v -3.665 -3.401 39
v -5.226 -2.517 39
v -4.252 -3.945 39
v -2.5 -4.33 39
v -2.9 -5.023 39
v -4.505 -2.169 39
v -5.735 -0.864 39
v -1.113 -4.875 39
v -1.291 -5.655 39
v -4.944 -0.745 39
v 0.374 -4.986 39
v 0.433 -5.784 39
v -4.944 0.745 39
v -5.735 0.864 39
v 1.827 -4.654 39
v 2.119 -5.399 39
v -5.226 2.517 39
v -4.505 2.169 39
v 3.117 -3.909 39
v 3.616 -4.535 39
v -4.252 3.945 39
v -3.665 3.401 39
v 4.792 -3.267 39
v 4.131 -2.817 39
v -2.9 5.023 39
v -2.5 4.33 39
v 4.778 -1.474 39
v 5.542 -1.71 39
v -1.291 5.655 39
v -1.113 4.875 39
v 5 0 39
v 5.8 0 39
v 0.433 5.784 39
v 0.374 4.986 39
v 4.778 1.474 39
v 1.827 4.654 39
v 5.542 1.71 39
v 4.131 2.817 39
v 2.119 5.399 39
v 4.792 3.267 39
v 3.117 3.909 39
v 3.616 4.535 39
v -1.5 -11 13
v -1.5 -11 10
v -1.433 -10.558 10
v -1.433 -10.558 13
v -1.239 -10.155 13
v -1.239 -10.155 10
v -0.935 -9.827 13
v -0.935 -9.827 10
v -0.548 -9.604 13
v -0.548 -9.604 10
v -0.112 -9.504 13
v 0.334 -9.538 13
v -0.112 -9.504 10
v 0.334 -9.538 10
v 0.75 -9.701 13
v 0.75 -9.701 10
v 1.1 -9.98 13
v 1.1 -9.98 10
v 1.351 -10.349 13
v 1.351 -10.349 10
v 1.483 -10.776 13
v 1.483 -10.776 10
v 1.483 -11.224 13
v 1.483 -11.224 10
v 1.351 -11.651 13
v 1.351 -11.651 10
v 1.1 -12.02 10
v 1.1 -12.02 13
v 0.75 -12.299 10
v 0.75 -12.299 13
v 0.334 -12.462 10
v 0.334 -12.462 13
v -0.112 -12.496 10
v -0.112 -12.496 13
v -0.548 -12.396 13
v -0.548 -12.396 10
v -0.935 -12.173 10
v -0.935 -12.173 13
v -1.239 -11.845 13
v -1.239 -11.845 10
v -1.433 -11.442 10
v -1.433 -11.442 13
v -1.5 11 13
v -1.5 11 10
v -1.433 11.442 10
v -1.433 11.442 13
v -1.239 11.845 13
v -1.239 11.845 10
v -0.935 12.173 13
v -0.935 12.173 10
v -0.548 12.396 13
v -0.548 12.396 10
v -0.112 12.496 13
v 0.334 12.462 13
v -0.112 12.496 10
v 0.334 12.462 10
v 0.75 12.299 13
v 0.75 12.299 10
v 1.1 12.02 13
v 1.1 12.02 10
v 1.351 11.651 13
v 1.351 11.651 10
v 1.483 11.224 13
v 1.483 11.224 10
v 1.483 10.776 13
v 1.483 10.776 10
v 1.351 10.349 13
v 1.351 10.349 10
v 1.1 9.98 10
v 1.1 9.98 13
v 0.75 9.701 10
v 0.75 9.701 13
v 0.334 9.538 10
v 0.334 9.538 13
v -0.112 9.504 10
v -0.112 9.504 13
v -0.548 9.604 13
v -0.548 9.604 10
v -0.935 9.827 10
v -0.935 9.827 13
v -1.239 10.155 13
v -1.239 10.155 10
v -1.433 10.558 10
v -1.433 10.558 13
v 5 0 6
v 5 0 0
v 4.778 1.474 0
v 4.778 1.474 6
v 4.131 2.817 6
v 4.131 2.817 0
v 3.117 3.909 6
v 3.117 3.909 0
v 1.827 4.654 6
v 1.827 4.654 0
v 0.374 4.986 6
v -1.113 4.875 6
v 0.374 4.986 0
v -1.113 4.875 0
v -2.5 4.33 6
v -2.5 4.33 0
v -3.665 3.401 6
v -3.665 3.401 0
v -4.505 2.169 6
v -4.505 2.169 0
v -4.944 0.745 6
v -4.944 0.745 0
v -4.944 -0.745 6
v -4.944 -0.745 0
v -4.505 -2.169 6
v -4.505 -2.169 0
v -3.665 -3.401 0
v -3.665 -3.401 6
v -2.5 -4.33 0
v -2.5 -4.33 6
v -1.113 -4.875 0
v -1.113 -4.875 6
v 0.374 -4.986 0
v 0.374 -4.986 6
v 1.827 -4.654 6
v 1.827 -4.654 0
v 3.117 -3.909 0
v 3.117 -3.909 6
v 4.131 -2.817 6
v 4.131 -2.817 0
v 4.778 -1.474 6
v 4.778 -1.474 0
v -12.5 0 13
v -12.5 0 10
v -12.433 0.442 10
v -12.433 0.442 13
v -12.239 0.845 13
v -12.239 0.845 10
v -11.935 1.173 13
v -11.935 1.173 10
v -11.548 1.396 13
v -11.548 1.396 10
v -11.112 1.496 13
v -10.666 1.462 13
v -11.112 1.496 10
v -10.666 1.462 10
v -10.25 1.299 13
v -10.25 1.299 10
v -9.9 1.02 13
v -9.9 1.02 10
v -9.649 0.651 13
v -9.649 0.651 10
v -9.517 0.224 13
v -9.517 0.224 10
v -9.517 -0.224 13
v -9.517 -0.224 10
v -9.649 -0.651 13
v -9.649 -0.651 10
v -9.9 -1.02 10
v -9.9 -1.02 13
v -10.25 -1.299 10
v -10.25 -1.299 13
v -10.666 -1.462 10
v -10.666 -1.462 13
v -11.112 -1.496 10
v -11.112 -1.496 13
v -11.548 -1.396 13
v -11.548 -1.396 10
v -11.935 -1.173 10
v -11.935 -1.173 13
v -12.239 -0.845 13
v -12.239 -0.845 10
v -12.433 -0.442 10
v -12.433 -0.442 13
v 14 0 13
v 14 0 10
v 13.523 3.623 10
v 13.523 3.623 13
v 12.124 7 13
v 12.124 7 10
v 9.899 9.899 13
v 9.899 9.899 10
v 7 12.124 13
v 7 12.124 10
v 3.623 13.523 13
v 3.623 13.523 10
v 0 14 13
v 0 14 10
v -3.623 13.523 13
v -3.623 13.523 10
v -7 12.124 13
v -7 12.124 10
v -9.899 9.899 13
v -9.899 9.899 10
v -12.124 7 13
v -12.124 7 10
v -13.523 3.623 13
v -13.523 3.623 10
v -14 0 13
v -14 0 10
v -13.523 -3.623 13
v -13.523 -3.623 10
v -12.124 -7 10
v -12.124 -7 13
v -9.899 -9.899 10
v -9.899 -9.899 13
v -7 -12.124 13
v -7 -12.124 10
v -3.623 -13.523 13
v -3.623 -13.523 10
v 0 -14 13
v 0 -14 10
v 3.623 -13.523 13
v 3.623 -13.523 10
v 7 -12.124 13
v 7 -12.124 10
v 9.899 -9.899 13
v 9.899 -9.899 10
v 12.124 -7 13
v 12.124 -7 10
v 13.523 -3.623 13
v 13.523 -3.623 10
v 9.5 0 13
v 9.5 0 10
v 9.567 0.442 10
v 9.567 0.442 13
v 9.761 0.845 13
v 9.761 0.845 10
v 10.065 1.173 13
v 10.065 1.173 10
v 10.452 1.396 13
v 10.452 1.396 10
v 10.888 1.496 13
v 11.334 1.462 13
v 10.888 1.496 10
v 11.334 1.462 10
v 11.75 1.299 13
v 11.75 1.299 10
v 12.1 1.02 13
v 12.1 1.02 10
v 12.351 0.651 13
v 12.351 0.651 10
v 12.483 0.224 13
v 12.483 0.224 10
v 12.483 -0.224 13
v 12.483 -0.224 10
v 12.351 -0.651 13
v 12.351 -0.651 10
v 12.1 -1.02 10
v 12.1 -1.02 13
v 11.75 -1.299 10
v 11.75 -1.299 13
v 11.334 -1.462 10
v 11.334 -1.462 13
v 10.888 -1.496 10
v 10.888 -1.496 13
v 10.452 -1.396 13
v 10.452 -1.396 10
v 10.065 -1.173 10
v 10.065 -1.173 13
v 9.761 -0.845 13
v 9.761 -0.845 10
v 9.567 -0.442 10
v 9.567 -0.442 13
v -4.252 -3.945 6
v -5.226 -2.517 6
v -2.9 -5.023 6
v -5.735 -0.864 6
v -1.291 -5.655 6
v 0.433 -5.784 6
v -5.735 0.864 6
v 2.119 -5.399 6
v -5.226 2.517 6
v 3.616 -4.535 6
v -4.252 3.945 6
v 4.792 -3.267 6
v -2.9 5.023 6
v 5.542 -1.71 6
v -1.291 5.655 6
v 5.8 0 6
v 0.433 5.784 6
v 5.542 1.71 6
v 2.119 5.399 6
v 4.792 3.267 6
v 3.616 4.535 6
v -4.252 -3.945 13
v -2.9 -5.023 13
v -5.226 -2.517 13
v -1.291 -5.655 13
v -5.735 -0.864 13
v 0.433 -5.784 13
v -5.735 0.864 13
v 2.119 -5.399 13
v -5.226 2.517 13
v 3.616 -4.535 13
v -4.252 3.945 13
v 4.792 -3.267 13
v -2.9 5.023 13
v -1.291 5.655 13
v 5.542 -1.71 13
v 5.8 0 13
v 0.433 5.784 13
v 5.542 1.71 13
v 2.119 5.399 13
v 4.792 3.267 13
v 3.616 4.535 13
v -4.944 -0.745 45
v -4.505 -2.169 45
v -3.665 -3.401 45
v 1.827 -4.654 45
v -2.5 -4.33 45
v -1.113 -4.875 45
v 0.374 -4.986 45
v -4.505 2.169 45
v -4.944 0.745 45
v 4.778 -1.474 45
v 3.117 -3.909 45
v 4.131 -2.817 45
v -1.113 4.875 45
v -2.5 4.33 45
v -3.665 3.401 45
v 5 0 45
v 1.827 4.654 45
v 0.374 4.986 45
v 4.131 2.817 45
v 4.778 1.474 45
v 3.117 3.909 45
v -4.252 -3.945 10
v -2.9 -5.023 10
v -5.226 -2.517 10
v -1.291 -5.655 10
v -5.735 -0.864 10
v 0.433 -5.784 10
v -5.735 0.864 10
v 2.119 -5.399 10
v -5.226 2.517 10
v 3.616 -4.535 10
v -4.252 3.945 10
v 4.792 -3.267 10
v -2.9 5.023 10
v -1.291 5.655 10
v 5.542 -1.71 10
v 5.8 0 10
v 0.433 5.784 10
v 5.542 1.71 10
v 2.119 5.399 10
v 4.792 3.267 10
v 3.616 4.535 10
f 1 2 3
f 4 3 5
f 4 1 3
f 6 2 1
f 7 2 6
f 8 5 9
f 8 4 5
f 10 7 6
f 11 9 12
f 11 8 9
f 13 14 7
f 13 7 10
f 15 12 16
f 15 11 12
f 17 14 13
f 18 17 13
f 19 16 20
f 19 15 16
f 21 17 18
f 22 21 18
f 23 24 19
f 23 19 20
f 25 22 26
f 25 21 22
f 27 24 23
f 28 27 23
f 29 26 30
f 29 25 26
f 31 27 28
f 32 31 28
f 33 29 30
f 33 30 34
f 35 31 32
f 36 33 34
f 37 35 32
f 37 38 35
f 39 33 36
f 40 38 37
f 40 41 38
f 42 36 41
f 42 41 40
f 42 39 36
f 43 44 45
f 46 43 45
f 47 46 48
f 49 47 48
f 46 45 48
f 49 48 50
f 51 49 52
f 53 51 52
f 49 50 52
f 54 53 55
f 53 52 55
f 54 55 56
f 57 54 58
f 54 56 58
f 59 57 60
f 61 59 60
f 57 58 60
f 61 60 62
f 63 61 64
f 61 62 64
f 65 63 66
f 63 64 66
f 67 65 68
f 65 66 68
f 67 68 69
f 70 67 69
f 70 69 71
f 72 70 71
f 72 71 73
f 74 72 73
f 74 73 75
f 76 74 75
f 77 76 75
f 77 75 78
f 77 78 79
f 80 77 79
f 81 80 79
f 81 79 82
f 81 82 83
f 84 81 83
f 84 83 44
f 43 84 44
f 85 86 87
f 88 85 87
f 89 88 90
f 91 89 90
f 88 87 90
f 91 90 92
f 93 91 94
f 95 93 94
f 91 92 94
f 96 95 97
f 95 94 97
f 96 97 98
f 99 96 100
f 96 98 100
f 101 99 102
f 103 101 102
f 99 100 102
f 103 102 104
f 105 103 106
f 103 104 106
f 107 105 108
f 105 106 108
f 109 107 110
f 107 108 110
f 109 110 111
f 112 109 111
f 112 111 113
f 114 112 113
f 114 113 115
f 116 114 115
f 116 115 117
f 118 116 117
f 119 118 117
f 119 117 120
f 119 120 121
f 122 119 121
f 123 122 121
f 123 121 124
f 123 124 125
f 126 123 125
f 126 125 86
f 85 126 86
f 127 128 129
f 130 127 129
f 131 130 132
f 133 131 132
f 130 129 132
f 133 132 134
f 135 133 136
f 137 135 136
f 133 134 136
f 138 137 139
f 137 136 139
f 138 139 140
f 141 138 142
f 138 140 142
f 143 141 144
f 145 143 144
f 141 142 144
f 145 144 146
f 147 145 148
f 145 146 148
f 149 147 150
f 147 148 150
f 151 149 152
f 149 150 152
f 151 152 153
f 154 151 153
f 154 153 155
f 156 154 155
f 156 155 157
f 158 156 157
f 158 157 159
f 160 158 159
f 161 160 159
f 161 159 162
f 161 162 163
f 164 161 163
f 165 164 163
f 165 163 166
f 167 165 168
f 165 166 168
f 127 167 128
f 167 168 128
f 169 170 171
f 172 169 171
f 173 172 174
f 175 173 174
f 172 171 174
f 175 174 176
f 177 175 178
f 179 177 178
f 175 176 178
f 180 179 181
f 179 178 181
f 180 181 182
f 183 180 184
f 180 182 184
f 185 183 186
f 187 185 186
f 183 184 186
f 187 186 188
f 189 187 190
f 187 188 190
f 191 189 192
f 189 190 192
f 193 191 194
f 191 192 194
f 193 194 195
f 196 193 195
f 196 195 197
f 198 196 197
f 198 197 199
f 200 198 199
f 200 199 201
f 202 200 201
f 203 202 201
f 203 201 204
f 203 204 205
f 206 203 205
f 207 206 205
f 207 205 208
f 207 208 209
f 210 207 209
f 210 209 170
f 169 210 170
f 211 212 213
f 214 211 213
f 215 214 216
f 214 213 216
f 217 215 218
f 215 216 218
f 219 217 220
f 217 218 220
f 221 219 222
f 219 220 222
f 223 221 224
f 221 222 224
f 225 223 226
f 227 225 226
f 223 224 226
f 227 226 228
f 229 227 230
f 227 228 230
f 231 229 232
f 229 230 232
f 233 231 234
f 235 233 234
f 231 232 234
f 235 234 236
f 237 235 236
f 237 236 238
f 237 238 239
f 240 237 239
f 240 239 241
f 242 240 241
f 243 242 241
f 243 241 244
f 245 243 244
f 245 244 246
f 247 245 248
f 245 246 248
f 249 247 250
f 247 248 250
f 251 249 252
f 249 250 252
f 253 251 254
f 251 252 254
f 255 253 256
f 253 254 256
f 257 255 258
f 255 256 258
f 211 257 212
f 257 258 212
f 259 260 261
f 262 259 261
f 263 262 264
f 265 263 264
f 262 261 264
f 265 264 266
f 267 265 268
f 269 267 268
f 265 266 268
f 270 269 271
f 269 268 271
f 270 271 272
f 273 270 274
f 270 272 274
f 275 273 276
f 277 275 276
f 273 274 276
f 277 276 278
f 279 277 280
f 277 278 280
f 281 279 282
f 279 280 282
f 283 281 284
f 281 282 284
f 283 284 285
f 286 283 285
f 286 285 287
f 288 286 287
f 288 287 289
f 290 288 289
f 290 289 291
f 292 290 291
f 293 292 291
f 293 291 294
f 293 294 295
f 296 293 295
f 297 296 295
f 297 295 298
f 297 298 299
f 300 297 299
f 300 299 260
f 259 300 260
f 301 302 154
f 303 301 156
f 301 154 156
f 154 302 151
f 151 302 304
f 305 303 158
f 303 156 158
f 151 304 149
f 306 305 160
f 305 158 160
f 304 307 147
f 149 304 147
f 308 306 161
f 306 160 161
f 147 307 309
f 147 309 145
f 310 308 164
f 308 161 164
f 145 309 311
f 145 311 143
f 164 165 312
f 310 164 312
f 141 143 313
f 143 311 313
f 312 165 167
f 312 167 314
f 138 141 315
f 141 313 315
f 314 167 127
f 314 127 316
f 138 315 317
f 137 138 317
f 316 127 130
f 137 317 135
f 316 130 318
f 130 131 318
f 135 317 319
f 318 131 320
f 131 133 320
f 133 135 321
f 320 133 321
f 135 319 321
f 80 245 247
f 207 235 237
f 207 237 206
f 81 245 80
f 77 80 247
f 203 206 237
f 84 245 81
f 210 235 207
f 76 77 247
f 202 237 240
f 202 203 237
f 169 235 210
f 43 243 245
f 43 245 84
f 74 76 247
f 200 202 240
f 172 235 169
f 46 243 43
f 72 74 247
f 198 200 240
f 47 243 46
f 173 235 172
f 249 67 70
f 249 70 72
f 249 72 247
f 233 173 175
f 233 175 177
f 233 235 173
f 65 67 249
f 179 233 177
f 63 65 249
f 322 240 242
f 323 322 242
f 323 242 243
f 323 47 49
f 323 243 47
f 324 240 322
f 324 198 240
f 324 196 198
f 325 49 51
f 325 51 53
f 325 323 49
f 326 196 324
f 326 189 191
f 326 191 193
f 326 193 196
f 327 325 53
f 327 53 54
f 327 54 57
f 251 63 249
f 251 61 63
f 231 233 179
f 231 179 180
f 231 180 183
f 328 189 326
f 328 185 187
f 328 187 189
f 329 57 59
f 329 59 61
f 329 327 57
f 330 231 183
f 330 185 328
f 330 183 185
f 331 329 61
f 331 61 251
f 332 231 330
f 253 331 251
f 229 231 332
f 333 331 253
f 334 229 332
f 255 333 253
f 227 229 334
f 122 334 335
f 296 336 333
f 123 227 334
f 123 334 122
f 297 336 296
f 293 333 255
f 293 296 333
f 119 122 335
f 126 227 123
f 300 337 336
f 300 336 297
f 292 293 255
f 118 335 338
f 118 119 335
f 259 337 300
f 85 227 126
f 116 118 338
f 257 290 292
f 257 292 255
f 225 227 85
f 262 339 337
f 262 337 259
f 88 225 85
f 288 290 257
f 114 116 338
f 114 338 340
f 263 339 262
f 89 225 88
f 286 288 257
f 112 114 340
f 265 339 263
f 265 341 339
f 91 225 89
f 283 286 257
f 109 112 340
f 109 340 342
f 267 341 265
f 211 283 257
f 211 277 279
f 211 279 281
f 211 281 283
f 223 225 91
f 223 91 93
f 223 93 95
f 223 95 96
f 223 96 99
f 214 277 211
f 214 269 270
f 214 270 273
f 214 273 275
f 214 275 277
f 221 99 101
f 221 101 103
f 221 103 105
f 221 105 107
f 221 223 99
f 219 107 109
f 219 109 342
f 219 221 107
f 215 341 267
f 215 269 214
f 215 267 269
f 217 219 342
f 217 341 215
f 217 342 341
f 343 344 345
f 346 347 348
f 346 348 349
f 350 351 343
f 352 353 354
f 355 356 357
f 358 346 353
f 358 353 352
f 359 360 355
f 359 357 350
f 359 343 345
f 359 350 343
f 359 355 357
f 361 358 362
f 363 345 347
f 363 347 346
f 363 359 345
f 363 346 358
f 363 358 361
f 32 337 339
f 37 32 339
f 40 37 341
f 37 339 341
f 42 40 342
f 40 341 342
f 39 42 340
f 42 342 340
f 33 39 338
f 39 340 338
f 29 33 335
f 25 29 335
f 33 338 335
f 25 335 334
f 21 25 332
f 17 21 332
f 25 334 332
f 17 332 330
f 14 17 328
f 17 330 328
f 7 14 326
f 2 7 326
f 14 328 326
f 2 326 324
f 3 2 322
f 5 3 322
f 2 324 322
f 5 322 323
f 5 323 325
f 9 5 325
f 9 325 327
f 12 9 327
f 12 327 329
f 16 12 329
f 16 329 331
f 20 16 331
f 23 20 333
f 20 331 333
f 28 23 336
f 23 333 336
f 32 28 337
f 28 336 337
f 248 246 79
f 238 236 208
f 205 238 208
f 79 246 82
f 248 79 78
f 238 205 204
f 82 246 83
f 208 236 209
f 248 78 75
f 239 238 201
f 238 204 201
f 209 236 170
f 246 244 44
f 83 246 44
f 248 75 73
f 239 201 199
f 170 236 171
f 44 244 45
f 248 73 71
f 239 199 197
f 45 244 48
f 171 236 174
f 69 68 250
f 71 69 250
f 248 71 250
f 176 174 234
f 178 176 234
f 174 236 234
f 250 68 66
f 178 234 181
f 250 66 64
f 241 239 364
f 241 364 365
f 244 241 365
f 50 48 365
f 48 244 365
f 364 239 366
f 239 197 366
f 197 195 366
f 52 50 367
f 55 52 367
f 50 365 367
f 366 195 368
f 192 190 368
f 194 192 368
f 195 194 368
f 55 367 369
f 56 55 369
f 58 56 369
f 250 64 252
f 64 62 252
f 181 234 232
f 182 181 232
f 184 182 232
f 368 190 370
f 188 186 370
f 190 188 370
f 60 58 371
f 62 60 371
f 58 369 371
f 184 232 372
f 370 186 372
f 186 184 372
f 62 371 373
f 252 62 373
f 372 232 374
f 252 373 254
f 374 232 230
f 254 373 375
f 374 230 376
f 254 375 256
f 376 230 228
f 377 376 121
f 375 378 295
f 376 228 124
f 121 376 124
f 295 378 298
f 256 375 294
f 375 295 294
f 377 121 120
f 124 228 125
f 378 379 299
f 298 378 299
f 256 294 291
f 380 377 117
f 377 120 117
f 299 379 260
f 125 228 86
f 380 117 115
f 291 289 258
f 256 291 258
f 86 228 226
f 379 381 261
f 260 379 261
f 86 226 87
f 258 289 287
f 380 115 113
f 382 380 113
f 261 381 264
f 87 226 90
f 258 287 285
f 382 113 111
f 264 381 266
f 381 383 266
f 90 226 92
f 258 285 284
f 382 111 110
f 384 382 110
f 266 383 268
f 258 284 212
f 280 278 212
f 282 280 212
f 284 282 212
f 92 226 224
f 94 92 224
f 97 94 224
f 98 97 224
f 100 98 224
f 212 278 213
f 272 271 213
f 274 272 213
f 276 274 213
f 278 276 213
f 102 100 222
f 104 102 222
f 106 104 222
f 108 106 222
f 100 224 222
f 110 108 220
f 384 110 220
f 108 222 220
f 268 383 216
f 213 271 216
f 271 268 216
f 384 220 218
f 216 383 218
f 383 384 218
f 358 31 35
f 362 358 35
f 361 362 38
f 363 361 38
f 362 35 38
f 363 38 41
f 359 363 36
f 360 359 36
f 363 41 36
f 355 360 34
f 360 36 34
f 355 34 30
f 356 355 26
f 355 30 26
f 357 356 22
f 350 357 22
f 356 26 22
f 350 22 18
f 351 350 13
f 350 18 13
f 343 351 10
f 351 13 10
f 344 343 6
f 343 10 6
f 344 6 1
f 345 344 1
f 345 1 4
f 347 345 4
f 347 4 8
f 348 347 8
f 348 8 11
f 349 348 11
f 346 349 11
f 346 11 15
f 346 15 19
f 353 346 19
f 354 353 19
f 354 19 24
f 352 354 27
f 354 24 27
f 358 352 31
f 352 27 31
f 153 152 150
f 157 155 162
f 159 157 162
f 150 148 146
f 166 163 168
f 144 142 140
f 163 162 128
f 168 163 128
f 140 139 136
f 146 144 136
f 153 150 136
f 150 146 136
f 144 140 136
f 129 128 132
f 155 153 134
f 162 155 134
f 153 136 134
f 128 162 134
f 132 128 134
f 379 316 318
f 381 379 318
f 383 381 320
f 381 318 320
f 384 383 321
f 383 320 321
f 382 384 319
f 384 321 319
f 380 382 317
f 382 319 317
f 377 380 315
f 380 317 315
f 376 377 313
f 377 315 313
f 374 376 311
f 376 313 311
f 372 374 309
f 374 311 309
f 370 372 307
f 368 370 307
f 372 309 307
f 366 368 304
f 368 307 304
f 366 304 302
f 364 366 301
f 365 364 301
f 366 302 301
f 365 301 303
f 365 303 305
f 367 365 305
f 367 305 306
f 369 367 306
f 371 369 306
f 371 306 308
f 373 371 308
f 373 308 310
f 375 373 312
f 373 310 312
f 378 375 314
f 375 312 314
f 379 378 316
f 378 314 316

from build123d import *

# Parameters (mm, degrees)
CROQUIS1_R              = 5
SALIENTE_EXTRUIR1_DEPTH = 6
CROQUIS2_R              = 5.8
SALIENTE_EXTRUIR2_DEPTH = 4
CROQUIS3_R              = 14
SALIENTE_EXTRUIR3_DEPTH = 3
CROQUIS4_R              = 5.8
SALIENTE_EXTRUIR4_DEPTH = 26
CROQUIS5_R              = 5
SALIENTE_EXTRUIR5_DEPTH = 6
CROQUIS6_R              = 1.5
CORTAR_EXTRUIR1_DEPTH   = 6


with BuildPart() as part:
    # Croquis1 → Saliente-Extruir1 (new body)
    with BuildSketch(Plane.XY):
        Circle(CROQUIS1_R)
    extrude(amount=SALIENTE_EXTRUIR1_DEPTH)

    # Croquis2 → Saliente-Extruir2 (add)
    with BuildSketch(Plane.XY.offset(6)):
        Circle(CROQUIS2_R)
    extrude(amount=SALIENTE_EXTRUIR2_DEPTH)

    # Croquis3 → Saliente-Extruir3 (add)
    with BuildSketch(Plane.XY.offset(10)):
        Circle(CROQUIS3_R)
    extrude(amount=SALIENTE_EXTRUIR3_DEPTH)

    # Croquis4 → Saliente-Extruir4 (add)
    with BuildSketch(Plane.XY.offset(13)):
        Circle(CROQUIS4_R)
    extrude(amount=SALIENTE_EXTRUIR4_DEPTH)

    # Croquis5 → Saliente-Extruir5 (add)
    with BuildSketch(Plane.XY.offset(39)):
        Circle(CROQUIS5_R)
    extrude(amount=SALIENTE_EXTRUIR5_DEPTH)

    # Croquis6 → Cortar-Extruir1 (cut)
    with BuildSketch(Plane(origin=(0, 0, 10), x_dir=(-1, 0, 0), z_dir=(0, 0, -1))):
        with Locations((11, 0)):
            Circle(CROQUIS6_R)
        with Locations((0, -11)):
            Circle(CROQUIS6_R)
        with Locations((-11, 0)):
            Circle(CROQUIS6_R)
        with Locations((0, 11)):
            Circle(CROQUIS6_R)
    extrude(amount=-CORTAR_EXTRUIR1_DEPTH, mode=Mode.SUBTRACT)


solid = part.part
